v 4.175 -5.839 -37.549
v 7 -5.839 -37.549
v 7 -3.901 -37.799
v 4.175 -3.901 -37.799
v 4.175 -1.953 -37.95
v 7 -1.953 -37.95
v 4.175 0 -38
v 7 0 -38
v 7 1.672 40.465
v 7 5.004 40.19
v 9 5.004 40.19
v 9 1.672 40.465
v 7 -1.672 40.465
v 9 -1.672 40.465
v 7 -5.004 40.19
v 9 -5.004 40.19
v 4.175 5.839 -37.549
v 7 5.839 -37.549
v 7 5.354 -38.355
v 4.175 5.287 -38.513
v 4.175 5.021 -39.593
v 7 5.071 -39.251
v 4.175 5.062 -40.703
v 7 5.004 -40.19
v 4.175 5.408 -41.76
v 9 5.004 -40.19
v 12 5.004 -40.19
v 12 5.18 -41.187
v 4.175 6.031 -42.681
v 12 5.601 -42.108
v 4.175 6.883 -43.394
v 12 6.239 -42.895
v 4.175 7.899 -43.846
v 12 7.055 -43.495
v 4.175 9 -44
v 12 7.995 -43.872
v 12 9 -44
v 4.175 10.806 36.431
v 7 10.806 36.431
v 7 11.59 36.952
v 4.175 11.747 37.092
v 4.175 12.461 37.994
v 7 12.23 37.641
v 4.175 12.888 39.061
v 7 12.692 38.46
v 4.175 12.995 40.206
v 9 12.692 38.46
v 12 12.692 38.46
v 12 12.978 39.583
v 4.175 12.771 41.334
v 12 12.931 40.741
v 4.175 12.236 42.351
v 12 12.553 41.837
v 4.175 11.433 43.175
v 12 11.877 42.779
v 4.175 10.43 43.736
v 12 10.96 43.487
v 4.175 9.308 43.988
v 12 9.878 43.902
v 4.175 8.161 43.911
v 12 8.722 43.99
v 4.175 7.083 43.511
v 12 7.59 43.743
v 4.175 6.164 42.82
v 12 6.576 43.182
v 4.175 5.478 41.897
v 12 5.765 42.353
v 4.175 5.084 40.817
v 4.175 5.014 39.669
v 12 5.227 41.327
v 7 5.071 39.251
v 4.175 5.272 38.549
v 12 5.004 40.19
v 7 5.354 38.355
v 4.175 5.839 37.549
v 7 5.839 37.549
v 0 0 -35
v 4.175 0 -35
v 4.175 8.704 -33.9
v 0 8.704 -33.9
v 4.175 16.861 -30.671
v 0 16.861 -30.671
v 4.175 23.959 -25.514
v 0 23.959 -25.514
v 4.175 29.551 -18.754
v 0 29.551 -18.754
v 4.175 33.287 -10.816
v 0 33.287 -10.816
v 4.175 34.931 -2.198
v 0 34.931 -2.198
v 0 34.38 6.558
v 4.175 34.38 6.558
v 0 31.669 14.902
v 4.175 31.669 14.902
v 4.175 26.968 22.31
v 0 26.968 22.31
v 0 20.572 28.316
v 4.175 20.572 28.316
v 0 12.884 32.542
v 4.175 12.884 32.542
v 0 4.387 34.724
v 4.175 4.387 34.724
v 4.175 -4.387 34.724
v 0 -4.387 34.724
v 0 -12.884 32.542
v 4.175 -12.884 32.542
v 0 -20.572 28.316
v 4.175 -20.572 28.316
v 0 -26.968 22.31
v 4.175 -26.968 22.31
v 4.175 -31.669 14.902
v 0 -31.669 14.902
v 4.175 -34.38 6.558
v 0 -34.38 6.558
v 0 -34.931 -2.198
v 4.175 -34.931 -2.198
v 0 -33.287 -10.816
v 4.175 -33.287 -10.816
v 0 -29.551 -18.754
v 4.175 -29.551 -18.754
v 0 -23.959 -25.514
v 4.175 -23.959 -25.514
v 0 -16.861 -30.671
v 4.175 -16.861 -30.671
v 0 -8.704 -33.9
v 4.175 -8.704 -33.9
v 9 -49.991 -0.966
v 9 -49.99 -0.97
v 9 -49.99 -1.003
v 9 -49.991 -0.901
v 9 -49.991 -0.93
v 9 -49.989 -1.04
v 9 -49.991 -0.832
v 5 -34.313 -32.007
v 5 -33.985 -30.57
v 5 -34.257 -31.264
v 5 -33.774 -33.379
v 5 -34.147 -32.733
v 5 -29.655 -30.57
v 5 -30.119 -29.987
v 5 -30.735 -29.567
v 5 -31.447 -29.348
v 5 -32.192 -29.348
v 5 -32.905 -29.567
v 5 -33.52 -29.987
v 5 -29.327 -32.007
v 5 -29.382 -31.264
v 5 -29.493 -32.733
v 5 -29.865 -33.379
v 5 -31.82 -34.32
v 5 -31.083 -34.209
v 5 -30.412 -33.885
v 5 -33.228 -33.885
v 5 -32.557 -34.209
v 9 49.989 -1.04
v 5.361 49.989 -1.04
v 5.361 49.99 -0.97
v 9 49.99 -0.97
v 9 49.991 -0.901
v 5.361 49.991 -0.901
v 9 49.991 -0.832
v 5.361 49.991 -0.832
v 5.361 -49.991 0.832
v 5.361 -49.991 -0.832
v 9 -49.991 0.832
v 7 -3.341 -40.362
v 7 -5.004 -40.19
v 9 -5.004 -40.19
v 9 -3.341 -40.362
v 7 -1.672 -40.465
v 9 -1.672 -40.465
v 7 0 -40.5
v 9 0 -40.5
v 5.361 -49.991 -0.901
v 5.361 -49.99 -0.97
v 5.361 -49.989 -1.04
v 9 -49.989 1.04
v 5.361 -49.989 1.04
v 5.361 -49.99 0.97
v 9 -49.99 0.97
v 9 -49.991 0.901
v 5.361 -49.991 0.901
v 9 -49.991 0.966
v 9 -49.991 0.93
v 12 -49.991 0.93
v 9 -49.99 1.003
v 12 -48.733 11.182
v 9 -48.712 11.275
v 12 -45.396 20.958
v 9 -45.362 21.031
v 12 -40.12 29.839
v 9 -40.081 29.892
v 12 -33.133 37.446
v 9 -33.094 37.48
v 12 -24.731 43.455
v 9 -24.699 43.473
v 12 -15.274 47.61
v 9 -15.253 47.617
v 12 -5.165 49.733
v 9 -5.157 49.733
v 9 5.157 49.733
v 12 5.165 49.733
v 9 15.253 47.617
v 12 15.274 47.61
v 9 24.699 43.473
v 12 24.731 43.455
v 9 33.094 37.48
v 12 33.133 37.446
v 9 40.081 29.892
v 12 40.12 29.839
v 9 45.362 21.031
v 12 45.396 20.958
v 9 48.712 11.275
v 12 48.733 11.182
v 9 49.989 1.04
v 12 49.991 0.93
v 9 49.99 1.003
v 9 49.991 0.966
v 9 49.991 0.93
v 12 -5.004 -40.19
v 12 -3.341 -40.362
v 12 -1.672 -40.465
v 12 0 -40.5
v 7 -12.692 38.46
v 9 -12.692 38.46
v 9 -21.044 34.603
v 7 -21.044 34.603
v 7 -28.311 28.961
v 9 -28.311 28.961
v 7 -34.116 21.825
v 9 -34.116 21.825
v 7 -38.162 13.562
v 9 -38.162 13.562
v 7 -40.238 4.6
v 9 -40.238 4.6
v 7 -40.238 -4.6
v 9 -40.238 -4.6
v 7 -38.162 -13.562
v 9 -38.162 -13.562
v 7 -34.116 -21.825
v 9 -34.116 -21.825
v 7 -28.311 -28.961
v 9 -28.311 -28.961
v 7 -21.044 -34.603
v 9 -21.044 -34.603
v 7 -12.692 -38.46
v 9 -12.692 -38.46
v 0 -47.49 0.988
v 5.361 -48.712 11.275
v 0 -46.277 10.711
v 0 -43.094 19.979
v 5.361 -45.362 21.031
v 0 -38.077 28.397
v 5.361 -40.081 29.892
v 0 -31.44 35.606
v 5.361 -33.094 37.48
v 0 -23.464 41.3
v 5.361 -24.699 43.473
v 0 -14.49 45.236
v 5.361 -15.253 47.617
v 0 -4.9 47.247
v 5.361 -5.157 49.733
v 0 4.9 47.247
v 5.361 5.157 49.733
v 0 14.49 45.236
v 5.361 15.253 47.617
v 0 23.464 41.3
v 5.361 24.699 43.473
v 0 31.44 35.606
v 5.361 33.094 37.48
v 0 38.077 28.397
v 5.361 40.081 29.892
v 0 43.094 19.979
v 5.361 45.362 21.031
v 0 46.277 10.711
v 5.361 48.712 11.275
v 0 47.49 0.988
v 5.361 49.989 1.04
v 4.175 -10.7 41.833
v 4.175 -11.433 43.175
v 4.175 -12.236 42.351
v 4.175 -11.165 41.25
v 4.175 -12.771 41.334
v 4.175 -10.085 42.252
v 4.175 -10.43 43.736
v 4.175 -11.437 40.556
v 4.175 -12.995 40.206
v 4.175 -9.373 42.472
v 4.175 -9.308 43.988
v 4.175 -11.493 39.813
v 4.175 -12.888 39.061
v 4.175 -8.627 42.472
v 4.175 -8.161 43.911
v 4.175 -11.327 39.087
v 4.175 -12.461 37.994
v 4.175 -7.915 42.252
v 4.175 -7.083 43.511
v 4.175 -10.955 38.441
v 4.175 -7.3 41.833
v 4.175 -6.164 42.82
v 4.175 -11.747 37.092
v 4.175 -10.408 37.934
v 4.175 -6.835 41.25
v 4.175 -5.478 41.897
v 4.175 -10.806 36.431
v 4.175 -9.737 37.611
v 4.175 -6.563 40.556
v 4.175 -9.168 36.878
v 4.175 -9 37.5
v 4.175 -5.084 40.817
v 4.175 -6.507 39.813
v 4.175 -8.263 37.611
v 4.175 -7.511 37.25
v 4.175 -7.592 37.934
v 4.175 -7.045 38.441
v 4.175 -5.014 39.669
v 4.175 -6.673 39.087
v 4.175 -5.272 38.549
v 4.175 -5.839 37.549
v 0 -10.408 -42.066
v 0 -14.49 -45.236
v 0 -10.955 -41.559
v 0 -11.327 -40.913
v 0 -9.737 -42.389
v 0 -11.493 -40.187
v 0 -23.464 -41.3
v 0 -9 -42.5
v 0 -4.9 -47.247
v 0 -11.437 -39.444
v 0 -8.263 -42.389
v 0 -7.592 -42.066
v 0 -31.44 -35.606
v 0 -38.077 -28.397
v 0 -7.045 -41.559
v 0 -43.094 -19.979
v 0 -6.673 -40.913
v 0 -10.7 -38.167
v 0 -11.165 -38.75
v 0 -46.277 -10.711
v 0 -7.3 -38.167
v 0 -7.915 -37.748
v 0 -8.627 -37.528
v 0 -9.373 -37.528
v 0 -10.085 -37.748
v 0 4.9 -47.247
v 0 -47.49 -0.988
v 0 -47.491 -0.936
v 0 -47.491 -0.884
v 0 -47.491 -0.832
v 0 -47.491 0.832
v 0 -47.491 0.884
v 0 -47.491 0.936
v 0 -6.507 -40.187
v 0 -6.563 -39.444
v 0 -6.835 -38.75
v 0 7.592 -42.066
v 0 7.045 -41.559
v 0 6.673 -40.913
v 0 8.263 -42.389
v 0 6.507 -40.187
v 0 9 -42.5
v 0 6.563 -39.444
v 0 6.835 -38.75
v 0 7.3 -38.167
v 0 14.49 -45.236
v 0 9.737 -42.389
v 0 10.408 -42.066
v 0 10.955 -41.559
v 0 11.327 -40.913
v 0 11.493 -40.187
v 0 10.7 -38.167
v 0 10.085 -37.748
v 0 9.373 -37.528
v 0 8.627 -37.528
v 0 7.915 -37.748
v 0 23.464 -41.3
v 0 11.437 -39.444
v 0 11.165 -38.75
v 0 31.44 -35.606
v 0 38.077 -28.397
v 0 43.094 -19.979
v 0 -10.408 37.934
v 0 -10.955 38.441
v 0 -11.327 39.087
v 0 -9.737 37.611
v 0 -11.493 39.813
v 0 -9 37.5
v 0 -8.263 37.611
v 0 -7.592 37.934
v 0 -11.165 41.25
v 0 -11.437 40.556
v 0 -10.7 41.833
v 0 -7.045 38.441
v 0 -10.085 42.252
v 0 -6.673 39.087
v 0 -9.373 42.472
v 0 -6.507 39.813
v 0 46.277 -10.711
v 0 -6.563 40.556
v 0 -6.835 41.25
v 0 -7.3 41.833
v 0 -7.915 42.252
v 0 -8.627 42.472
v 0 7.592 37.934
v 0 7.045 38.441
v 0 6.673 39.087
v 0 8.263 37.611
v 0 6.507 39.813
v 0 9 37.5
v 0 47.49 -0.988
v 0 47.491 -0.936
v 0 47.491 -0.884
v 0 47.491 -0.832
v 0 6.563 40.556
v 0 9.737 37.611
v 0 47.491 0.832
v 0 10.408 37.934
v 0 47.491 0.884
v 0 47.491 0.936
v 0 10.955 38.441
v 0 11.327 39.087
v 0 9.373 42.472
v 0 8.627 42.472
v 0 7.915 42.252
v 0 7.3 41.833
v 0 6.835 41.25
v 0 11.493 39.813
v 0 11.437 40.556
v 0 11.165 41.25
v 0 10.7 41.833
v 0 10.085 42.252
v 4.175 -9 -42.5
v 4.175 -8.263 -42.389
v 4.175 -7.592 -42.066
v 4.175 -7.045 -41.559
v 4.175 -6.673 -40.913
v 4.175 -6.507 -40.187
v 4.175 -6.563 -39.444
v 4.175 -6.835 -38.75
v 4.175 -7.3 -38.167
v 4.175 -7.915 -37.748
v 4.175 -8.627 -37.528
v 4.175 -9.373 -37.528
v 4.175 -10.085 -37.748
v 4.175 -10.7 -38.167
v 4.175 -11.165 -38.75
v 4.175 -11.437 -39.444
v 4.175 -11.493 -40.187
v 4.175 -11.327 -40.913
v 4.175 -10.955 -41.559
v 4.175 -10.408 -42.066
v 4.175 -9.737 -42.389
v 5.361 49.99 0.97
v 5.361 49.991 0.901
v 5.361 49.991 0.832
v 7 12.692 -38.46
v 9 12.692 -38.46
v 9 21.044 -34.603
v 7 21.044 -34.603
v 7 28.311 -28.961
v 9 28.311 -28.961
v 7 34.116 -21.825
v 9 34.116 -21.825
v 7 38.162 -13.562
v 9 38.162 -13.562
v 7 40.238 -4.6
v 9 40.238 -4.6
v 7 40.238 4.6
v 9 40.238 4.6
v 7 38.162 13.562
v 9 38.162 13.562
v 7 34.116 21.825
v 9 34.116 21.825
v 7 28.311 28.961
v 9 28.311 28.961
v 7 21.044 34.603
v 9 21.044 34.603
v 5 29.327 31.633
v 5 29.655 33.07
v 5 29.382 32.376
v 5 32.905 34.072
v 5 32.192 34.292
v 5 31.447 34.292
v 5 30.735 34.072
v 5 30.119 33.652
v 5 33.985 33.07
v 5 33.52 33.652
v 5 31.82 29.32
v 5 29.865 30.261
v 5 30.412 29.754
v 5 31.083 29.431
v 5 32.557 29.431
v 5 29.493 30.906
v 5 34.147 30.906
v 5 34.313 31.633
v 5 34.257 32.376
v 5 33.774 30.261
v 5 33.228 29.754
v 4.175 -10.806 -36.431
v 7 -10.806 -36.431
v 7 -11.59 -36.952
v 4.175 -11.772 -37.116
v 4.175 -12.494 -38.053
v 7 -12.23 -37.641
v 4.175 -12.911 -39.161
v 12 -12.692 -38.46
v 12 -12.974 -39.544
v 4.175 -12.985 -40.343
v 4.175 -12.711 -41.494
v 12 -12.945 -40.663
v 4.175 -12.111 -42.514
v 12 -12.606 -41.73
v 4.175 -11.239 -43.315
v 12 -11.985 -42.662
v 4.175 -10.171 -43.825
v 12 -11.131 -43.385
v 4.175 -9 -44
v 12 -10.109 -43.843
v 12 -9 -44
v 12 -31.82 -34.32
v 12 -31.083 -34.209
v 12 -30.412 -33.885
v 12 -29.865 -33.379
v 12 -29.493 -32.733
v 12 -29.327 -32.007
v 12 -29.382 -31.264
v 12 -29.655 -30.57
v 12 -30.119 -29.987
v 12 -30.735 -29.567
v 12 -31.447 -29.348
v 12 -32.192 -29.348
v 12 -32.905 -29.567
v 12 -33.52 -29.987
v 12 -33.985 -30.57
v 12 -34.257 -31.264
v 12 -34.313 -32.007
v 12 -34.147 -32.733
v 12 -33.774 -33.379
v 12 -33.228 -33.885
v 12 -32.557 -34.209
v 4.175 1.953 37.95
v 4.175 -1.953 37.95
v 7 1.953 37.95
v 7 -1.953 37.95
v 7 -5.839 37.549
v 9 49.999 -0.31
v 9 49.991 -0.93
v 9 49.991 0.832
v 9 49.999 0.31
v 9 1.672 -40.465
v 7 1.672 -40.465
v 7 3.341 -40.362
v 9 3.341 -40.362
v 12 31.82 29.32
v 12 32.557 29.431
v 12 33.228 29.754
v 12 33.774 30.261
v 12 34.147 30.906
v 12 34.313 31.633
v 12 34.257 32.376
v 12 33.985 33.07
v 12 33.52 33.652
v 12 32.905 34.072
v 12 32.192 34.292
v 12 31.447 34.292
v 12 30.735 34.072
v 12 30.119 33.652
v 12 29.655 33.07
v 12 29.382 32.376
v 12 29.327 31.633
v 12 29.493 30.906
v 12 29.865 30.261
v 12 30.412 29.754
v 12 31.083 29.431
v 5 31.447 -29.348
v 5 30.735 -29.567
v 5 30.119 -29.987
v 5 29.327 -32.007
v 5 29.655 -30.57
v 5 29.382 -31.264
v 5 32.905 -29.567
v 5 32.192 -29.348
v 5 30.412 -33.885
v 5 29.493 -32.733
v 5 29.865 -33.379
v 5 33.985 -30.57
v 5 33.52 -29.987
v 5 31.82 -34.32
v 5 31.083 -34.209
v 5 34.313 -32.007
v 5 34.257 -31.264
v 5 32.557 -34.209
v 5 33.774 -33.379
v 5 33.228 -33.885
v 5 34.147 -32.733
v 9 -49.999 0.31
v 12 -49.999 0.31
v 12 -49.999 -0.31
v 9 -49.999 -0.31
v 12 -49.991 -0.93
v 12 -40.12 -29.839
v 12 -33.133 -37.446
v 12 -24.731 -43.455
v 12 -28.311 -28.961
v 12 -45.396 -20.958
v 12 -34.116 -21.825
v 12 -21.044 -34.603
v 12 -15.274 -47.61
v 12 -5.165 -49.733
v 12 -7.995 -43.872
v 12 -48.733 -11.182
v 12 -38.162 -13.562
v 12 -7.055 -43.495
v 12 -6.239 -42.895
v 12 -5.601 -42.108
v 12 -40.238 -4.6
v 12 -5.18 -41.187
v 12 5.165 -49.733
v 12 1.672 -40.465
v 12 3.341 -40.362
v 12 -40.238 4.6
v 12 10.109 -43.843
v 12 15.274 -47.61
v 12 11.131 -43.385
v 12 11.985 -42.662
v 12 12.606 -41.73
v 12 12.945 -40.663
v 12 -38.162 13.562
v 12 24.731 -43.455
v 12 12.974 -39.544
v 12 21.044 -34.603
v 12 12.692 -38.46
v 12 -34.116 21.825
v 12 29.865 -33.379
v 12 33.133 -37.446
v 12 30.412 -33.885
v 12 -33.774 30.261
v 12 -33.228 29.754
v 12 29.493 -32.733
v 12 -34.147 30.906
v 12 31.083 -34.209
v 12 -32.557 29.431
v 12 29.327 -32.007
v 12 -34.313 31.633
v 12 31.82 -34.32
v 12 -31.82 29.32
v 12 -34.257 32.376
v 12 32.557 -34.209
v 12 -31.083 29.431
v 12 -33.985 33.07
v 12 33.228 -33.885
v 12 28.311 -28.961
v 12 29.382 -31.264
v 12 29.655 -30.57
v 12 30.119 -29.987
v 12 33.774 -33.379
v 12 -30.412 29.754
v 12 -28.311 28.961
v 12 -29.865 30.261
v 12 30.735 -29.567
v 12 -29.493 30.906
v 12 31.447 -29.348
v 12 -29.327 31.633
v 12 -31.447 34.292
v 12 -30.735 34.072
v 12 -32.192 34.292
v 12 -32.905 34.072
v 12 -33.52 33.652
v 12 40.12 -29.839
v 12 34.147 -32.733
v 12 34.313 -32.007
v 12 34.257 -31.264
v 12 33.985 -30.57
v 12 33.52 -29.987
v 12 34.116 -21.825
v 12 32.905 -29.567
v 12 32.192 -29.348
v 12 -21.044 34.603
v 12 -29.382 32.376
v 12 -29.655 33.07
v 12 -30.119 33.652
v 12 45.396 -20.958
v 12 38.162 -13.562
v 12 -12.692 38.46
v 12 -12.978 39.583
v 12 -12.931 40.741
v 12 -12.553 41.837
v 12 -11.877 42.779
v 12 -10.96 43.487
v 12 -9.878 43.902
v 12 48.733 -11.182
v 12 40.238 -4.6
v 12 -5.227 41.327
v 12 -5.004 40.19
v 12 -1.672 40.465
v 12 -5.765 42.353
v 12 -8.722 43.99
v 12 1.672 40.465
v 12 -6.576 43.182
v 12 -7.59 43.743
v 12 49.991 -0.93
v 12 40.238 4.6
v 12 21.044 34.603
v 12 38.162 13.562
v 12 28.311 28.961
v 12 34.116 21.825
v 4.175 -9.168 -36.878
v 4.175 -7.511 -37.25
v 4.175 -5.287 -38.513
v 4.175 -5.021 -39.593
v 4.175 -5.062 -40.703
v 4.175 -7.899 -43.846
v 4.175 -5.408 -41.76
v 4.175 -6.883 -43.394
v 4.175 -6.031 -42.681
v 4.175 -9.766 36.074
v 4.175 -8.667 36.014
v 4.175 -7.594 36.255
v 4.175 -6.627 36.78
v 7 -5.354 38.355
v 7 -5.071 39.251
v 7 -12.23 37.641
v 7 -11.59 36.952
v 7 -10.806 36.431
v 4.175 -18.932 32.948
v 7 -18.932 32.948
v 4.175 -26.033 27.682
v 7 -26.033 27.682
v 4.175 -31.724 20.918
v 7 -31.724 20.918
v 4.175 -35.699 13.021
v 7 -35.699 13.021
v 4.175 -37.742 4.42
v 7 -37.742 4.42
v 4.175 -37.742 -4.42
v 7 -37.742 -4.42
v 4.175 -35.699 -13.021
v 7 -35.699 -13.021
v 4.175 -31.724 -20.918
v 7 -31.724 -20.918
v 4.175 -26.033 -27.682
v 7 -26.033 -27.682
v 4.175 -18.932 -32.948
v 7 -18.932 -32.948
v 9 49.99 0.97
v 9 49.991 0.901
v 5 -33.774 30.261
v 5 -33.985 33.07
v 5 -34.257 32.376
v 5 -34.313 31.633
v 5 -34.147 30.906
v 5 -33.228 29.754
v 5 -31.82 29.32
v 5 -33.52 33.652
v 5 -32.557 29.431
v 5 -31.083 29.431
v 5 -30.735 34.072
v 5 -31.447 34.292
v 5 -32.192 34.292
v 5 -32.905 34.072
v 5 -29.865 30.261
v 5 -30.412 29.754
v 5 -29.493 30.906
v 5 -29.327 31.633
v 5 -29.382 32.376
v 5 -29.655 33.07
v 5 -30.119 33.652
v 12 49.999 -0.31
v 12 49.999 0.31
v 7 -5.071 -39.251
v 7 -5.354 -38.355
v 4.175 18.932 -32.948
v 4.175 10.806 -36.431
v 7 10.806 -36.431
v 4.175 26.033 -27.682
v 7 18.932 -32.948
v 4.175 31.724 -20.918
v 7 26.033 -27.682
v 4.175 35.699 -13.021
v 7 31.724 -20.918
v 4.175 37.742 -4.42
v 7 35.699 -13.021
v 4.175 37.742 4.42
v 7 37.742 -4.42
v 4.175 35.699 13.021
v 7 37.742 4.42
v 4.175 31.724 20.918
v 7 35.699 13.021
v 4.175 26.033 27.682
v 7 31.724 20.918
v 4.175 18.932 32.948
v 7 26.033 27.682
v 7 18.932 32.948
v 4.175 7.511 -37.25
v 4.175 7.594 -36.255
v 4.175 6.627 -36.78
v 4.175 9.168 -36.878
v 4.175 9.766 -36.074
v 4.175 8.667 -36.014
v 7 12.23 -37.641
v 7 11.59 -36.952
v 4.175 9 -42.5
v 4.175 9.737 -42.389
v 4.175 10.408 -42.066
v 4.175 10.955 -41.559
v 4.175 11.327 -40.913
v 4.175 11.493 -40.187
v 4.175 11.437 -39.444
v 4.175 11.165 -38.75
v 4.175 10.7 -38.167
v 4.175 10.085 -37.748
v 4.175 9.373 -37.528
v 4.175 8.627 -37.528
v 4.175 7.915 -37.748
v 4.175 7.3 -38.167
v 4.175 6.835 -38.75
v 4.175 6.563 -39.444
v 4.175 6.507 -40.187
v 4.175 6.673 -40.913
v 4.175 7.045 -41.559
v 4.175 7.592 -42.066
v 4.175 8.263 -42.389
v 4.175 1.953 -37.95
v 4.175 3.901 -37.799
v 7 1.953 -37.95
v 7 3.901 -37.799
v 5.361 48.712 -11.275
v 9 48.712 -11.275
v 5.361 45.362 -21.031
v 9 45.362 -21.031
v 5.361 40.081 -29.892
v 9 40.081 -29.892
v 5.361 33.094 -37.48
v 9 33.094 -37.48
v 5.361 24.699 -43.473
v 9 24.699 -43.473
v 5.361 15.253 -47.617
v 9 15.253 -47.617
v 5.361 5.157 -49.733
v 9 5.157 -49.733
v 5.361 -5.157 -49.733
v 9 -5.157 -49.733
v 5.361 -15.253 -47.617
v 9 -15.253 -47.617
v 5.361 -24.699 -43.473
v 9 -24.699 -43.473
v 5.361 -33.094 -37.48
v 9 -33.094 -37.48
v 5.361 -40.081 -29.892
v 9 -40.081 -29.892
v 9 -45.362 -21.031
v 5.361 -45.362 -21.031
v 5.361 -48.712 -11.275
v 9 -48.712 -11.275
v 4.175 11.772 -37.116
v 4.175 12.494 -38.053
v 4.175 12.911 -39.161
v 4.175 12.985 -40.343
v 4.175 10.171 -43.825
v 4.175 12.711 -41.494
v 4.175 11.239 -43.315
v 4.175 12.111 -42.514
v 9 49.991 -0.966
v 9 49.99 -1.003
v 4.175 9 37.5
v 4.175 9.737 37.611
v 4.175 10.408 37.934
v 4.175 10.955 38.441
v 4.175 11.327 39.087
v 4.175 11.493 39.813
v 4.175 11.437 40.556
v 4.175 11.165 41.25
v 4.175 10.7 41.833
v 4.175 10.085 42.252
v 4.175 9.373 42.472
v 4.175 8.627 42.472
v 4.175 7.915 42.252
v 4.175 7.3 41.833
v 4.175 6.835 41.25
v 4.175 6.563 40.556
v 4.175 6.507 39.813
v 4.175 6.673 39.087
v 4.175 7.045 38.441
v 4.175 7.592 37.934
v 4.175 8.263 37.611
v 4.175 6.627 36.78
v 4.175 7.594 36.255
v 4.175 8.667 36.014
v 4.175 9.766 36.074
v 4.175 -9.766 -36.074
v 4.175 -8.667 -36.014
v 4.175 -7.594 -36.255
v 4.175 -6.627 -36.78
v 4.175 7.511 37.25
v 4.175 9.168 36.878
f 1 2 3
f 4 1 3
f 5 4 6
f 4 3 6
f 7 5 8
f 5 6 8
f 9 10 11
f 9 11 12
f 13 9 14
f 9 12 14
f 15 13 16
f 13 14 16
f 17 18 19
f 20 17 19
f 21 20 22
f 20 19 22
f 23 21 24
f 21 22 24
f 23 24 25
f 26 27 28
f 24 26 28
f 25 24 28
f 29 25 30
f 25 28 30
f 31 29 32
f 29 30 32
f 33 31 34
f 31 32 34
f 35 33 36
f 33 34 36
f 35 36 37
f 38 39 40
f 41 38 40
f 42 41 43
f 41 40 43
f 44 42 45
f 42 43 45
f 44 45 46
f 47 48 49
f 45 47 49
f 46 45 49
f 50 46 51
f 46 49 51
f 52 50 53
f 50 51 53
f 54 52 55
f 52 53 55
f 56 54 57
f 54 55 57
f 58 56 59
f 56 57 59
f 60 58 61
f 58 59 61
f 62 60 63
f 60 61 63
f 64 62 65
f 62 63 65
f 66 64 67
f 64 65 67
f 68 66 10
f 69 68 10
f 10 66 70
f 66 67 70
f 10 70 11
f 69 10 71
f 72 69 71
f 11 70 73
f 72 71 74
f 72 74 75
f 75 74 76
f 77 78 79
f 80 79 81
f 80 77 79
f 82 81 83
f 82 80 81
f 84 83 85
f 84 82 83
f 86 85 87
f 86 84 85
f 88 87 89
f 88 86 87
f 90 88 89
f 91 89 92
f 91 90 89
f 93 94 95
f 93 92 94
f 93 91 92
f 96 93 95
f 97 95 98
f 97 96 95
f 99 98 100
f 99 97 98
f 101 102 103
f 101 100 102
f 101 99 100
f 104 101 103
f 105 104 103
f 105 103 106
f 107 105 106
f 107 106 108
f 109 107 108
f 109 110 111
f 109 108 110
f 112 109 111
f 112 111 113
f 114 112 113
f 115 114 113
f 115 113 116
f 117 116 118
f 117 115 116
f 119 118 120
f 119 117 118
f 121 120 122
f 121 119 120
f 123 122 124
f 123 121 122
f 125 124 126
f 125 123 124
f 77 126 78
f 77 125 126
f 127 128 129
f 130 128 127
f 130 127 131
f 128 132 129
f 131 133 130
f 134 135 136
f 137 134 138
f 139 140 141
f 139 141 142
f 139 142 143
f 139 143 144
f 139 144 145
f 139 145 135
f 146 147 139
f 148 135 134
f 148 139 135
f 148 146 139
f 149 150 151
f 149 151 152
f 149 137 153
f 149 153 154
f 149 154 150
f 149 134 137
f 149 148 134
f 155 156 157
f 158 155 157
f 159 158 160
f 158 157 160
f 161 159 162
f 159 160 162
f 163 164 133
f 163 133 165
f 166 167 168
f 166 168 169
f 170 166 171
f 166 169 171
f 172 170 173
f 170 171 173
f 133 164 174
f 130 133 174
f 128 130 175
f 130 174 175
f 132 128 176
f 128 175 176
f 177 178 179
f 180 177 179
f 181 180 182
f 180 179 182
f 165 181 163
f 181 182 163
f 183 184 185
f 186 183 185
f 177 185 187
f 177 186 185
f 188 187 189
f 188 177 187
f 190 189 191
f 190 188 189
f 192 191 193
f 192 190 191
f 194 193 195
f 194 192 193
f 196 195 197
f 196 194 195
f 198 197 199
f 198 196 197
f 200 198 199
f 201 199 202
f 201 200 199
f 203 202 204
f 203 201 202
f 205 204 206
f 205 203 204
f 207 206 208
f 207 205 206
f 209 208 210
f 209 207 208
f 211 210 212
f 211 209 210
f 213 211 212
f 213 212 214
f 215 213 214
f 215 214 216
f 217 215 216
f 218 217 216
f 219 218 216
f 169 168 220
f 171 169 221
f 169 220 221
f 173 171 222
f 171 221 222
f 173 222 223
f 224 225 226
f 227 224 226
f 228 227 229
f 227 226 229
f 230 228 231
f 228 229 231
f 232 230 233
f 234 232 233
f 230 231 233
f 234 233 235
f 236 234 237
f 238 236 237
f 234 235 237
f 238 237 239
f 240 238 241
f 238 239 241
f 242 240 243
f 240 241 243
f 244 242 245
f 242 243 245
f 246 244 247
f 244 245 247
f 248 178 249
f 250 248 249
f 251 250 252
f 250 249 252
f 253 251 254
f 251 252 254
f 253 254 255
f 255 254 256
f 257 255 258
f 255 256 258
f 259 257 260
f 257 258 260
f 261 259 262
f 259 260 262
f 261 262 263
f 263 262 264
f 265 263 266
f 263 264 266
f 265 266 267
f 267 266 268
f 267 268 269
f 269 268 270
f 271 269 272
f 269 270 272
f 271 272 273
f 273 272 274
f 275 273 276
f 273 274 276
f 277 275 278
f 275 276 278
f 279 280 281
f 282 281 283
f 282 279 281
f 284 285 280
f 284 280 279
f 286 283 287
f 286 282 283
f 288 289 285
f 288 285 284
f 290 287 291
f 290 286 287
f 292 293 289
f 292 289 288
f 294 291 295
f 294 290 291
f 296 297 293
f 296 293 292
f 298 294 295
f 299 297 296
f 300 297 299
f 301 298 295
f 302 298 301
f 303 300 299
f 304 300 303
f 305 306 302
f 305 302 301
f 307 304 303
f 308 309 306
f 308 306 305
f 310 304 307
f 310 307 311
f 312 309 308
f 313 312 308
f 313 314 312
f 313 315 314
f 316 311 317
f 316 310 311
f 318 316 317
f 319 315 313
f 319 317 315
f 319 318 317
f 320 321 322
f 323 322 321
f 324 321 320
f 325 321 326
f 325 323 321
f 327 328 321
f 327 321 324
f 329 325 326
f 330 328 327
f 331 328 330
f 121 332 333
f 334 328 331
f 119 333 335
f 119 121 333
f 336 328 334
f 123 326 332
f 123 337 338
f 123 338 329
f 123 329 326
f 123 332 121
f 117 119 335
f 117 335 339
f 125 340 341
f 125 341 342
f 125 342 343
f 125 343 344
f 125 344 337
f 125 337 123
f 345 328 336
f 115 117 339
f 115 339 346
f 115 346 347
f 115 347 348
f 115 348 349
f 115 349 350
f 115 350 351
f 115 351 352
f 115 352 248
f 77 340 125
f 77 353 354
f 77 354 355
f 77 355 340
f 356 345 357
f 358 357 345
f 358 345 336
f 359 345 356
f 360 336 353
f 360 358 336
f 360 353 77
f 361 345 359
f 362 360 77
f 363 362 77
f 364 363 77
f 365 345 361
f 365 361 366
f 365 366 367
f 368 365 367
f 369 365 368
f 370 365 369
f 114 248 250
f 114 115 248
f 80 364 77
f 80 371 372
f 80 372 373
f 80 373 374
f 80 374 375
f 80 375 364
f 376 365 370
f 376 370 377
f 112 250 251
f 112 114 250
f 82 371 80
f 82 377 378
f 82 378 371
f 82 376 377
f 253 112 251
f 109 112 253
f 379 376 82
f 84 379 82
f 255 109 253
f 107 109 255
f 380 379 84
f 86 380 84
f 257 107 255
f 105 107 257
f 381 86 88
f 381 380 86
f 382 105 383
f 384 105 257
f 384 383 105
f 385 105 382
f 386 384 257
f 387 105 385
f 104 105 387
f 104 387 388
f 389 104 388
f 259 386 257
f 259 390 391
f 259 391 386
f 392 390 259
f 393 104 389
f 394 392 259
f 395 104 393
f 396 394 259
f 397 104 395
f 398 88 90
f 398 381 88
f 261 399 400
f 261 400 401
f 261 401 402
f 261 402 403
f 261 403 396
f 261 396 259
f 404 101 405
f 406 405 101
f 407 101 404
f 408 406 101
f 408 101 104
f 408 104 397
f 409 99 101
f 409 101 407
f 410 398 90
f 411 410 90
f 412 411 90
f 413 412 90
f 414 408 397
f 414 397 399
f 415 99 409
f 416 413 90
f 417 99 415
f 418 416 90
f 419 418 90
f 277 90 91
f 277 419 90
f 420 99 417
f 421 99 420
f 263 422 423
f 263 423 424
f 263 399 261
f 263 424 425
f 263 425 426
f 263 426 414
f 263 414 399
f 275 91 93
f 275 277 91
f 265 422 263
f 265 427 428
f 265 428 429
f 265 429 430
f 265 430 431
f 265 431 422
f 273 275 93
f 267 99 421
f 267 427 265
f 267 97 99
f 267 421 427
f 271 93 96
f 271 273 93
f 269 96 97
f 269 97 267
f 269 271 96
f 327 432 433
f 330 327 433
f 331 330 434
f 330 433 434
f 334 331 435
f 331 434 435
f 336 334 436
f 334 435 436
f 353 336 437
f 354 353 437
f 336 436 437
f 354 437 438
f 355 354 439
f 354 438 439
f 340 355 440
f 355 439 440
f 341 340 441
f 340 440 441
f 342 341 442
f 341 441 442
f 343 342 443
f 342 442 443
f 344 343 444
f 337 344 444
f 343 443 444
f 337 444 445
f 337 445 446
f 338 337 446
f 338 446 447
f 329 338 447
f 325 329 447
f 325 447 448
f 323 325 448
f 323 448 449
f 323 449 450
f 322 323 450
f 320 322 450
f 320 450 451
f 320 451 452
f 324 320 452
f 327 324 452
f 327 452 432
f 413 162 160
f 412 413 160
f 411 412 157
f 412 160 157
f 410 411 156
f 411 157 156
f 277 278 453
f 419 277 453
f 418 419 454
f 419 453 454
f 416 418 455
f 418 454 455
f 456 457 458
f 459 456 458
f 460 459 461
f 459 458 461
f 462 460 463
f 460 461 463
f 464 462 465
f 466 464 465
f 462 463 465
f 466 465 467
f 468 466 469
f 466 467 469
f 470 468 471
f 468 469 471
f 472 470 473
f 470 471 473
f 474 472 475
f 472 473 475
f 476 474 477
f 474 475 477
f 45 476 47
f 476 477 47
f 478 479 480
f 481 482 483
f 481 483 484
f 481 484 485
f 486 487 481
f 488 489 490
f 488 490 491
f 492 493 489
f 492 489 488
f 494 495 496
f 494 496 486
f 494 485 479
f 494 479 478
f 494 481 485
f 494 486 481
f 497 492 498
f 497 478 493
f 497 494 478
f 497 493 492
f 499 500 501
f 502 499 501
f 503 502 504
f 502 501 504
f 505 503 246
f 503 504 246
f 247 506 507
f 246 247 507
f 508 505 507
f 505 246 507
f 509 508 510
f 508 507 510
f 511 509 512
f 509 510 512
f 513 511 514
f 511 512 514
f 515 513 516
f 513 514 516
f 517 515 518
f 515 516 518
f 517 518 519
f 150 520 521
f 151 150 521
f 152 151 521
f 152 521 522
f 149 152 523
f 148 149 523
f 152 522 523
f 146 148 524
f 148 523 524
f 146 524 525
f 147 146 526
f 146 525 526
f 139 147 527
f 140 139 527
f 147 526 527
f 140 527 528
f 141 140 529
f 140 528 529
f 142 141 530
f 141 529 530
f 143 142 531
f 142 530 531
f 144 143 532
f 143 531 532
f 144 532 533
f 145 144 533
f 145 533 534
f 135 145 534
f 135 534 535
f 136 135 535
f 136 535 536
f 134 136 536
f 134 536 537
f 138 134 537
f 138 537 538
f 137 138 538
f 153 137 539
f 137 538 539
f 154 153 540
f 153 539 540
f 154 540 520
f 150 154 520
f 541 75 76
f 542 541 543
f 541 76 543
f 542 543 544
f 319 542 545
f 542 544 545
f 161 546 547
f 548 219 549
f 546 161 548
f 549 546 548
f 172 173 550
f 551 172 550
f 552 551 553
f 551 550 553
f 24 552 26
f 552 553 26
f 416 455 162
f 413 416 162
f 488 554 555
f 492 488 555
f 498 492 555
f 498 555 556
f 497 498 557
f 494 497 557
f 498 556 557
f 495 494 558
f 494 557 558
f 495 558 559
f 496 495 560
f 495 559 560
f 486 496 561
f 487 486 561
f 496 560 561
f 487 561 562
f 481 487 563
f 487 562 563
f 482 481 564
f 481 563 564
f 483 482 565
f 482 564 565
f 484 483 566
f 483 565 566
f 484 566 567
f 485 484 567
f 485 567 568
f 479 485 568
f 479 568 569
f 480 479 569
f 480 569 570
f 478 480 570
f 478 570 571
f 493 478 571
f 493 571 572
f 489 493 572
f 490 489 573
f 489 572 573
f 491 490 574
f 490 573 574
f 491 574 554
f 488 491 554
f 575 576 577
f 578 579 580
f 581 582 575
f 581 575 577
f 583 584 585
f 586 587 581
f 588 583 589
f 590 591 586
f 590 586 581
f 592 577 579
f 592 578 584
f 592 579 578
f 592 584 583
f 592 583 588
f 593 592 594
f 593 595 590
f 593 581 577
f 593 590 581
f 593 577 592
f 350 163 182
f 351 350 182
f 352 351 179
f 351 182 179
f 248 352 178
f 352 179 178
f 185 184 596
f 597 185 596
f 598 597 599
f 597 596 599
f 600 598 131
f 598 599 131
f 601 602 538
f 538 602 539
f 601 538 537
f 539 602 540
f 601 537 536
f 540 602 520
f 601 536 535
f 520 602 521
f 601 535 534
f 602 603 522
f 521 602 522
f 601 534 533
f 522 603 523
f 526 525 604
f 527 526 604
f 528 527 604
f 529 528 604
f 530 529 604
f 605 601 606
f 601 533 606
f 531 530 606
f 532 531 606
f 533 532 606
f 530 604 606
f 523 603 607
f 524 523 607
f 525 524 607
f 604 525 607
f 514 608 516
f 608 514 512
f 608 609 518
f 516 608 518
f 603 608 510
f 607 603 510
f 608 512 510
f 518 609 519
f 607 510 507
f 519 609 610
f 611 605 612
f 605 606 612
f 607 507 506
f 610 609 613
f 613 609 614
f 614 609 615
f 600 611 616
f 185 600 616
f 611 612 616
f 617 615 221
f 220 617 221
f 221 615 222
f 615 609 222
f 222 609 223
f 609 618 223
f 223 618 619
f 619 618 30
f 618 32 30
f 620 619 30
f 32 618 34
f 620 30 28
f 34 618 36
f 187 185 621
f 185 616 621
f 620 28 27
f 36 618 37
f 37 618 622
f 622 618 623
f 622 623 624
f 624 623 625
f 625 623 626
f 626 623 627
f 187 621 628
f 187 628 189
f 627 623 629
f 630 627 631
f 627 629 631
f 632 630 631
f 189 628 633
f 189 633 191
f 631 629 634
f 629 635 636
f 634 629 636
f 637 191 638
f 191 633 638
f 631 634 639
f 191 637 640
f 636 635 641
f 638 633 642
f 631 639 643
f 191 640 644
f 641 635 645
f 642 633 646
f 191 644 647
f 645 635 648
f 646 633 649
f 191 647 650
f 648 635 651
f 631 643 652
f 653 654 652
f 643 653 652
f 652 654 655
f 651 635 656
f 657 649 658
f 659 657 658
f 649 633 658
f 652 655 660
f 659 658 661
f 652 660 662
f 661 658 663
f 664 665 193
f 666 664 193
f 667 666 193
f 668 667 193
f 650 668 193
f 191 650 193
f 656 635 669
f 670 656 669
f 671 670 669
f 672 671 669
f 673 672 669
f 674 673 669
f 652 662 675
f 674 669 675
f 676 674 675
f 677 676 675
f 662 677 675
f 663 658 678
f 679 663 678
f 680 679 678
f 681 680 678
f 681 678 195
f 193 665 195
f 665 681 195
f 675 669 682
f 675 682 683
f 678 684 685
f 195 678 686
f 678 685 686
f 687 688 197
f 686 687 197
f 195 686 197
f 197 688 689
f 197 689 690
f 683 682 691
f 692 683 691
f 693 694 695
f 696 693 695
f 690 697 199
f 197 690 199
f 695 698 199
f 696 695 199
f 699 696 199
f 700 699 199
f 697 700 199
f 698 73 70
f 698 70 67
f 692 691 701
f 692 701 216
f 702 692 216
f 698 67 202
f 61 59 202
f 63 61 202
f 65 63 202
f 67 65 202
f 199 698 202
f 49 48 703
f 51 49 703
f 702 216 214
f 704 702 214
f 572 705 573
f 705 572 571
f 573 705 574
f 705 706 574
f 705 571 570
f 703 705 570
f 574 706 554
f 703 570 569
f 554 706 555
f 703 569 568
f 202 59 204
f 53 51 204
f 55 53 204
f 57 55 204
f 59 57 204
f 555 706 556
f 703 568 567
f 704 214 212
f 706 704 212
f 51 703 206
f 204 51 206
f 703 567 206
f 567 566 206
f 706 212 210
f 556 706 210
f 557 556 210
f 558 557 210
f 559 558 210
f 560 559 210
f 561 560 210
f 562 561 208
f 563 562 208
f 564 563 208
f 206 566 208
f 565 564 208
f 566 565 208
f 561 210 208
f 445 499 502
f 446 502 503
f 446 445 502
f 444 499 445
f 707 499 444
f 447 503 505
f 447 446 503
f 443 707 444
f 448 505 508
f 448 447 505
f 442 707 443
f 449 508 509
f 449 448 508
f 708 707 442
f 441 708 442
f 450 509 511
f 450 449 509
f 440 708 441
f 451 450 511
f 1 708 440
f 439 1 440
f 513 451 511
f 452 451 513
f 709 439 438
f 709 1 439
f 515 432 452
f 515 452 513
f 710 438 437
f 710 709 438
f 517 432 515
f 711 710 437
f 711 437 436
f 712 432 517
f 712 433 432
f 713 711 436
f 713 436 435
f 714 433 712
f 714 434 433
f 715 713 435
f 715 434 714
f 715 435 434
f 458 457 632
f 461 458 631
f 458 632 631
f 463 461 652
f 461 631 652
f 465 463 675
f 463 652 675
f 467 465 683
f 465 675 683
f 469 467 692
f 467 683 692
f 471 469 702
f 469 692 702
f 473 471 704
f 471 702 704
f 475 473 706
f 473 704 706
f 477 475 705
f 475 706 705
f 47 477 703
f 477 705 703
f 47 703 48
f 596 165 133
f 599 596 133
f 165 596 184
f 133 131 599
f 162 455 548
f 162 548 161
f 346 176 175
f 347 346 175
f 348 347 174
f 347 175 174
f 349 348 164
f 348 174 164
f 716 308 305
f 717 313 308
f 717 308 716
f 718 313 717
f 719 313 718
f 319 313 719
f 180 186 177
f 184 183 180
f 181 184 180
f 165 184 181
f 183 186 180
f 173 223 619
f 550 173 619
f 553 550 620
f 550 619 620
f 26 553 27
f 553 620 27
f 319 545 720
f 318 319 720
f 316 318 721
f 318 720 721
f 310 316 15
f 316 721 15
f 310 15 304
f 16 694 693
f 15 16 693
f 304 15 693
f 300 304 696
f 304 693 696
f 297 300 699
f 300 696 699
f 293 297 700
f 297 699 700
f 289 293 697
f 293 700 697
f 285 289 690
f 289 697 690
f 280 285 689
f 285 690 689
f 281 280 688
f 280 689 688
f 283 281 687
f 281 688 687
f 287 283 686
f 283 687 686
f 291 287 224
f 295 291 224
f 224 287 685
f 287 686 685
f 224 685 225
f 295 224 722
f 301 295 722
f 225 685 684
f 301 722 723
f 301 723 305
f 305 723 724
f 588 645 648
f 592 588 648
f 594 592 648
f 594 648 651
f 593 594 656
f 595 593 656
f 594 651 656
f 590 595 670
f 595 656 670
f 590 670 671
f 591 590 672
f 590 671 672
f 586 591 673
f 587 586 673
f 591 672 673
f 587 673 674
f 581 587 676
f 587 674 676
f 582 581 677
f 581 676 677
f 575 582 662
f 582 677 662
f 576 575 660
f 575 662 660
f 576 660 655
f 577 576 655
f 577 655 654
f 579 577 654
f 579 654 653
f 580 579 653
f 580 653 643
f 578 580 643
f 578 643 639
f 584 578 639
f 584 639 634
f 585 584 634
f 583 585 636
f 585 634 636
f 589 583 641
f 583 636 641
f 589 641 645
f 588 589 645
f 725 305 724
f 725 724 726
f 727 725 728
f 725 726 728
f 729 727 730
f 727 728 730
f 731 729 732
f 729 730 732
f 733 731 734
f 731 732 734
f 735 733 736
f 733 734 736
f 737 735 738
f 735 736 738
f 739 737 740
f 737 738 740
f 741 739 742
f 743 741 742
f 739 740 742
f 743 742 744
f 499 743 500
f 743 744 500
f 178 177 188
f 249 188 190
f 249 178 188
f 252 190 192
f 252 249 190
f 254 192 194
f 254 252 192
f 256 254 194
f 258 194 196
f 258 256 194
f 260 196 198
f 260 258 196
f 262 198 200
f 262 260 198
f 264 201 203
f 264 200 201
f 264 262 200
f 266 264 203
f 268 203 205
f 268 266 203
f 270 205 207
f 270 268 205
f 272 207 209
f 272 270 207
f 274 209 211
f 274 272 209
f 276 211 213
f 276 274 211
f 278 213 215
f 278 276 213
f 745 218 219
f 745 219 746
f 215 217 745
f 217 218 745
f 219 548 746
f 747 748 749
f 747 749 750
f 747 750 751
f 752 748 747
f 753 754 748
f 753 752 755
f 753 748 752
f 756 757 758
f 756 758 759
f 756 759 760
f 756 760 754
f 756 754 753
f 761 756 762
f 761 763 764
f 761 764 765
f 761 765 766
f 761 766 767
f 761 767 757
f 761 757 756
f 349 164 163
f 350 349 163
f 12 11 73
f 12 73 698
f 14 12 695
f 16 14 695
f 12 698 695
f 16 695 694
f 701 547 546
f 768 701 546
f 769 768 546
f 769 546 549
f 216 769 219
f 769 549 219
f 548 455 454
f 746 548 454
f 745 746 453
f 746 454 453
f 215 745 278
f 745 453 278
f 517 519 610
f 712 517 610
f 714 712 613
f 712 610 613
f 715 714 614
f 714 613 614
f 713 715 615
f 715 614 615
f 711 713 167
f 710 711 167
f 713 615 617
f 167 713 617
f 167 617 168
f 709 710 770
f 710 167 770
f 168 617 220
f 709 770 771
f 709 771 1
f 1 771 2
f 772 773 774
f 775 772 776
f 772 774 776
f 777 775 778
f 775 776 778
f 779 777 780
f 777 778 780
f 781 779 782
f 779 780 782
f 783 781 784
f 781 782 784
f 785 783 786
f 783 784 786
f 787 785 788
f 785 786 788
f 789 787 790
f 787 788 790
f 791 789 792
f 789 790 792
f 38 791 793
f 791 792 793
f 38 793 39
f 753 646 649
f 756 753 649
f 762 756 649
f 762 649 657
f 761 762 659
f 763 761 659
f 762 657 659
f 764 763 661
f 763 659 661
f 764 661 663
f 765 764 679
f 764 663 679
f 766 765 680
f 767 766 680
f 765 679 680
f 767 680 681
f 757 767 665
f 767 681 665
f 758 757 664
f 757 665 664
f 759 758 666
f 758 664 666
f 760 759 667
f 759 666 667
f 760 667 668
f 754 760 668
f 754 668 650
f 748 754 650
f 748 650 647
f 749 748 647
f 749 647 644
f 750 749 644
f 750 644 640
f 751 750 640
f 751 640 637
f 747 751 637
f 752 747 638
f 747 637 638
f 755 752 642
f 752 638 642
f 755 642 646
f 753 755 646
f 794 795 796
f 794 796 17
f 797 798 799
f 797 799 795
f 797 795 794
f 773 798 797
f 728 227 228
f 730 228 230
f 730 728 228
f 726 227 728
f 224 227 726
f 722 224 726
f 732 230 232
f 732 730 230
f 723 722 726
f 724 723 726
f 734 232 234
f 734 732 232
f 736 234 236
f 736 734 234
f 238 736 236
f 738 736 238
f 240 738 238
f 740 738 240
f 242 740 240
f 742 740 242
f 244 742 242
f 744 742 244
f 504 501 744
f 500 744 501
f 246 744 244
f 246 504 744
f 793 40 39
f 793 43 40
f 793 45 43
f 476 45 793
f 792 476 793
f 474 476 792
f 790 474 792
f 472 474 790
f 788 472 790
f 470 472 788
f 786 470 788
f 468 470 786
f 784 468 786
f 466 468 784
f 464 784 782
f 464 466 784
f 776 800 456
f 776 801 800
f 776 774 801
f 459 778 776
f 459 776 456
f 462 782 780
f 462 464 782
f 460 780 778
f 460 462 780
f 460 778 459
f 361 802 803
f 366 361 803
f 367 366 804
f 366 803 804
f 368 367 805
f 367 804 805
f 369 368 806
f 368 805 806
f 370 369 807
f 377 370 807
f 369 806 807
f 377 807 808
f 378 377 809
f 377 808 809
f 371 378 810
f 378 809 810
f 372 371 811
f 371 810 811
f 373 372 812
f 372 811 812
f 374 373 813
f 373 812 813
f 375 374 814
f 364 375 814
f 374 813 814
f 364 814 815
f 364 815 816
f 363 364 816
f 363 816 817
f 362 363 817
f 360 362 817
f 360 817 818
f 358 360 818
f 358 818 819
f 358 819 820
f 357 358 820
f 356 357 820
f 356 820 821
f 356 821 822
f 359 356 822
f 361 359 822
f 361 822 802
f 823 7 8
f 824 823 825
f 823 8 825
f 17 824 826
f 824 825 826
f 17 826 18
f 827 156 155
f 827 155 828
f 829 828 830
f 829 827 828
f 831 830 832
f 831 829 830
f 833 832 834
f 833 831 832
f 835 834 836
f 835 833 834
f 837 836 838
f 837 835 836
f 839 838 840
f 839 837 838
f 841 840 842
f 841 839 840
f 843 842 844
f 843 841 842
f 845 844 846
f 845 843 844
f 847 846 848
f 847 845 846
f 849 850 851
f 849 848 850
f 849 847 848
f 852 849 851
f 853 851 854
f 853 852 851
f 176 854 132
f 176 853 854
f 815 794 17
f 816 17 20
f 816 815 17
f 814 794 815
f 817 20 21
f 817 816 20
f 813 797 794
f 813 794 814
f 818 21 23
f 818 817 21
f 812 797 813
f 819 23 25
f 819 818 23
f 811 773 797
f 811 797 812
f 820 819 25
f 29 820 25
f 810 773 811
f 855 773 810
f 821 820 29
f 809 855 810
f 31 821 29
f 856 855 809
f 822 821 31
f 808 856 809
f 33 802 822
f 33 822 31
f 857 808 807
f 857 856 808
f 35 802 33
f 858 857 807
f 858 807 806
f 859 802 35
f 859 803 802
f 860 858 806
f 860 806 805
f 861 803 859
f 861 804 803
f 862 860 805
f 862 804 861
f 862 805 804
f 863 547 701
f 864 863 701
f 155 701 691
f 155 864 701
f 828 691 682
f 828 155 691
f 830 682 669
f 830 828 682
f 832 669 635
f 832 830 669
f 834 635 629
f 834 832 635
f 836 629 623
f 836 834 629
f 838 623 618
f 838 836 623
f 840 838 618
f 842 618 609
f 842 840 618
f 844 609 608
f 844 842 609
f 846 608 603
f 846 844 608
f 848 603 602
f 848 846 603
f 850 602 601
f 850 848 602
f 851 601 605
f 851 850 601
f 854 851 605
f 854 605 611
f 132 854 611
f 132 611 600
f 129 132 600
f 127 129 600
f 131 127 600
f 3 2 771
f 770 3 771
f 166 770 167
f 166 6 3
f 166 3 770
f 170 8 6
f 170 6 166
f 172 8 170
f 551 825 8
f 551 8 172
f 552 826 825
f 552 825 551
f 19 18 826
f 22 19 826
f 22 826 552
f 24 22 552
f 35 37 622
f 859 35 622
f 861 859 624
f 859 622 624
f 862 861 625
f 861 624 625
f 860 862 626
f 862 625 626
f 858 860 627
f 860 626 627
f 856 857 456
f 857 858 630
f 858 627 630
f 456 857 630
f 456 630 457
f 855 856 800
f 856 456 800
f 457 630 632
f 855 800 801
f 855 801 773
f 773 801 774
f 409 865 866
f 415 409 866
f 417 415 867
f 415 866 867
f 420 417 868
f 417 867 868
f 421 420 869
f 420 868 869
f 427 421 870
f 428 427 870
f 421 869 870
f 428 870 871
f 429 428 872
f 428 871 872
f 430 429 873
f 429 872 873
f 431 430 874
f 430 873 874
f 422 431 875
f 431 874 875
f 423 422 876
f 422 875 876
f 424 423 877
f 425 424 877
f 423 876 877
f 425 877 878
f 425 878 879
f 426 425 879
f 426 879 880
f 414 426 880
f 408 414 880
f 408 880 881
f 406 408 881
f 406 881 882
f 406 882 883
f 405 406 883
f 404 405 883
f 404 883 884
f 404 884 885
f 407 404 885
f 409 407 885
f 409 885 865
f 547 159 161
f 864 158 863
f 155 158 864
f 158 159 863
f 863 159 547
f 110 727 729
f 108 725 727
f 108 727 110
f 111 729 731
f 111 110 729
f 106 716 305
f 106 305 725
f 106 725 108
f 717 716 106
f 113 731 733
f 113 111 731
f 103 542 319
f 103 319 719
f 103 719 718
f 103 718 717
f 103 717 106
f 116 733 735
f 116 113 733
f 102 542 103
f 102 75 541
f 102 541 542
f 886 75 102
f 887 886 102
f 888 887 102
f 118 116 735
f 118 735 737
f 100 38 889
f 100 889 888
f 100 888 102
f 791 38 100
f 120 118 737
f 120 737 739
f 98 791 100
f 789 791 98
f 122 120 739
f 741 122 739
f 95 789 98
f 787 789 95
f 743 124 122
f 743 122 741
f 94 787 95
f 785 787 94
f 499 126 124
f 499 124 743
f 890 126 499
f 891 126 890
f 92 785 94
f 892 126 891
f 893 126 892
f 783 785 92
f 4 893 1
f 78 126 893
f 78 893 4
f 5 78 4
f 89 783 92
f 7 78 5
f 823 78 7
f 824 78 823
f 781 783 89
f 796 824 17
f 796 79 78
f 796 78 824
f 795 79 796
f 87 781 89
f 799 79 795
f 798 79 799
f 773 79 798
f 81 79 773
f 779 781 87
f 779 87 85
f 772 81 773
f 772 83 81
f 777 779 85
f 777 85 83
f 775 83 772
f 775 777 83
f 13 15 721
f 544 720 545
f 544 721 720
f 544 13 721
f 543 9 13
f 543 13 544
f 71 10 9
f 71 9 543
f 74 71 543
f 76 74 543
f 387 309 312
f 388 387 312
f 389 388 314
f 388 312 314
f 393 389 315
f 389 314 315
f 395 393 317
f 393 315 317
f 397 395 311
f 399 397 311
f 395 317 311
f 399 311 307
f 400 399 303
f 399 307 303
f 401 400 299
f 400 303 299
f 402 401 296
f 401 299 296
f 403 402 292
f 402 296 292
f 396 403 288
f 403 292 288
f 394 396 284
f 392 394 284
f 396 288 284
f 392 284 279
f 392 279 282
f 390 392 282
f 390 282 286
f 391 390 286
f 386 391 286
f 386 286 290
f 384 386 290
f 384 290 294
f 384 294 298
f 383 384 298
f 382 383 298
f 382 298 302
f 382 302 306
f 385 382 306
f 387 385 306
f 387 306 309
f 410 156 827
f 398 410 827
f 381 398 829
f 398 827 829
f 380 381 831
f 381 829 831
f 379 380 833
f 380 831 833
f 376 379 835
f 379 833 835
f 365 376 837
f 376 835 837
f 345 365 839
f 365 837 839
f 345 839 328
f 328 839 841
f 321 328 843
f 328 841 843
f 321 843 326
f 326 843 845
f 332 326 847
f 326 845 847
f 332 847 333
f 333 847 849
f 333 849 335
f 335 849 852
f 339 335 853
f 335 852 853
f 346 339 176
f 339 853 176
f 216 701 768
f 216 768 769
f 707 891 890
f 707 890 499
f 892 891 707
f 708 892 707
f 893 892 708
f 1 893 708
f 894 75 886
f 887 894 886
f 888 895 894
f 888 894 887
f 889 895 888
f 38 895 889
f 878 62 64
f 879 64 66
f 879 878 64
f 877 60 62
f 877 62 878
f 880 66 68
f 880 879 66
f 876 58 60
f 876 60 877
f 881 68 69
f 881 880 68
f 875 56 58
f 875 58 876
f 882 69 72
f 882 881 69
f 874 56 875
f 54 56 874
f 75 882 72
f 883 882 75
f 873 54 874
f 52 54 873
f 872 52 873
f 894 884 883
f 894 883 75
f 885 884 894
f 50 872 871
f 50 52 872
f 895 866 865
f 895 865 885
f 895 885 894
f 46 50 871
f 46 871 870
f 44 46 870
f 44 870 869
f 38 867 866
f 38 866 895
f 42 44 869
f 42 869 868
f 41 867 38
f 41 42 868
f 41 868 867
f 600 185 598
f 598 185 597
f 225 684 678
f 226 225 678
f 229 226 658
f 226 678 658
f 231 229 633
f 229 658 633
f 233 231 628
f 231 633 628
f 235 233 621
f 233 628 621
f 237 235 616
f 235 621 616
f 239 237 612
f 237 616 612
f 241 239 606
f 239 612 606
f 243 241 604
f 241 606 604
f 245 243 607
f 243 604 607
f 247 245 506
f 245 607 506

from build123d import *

# Parameters (mm, degrees)
SKETCH1_R           = 35.00000000000001
BOSS_EXTRUDE1_DEPTH = 12
SKETCH2_R           = 38
CUT_EXTRUDE1_DEPTH  = 7.825
SKETCH3_R           = 40.5
CUT_EXTRUDE2_DEPTH  = 5
BOSS_EXTRUDE3_START = -3
SKETCH4_R           = 50.000000000000014
SKETCH4_R_2         = 40.5
BOSS_EXTRUDE3_DEPTH = 3
FILLET1_R           = 10
SKETCH5_R           = 2.5000000000000018
CUT_EXTRUDE3_DEPTH  = 72.72168430816446
CUT_EXTRUDE4_REACH  = 73.722
SKETCH9_R           = 3.999999999999999
CHAMFER2_SIZE       = 2.5
CHAMFER2_SIZE2      = 5.361267301273932
SKETCH10_R          = 2.499999999999999
SKETCH10_R_2        = 2.5000000000000004
SKETCH10_R_3        = 2.5000000000000018
SKETCH10_R_4        = 2.499999999999998
CUT_EXTRUDE5_DEPTH  = 7


with BuildPart() as part:
    # Sketch1 → Boss-Extrude1 (new body)
    with BuildSketch(Plane(origin=(0, 0, 0), x_dir=(0, 0, -1), z_dir=(1, 0, 0))):
        with BuildLine():
            Line((-0.9297857327654514, 49.99135423741935), (0.9297857327657116, 49.99135423741935))
            ThreePointArc((0.9297857327657116, 49.99135423741935), (50, 4.17e-15), (0.9297857327657116, -49.99135423741935))
            Line((0.9297857327657116, -49.99135423741935), (-0.9297857327654514, -49.99135423741935))
            ThreePointArc((-0.9297857327654514, -49.99135423741935), (-50.00000000000001, 1.029e-14), (-0.9297857327654514, 49.99135423741935))
        make_face()
        Circle(SKETCH1_R, mode=Mode.SUBTRACT)
    extrude(amount=BOSS_EXTRUDE1_DEPTH)

    # Sketch2 → Cut-Extrude1 (cut)
    with BuildSketch(Plane(origin=(12, 0, 0), x_dir=(0, 0, -1), z_dir=(1, 0, 0))):
        Circle(SKETCH2_R)
    extrude(amount=-CUT_EXTRUDE1_DEPTH, mode=Mode.SUBTRACT)

    # Sketch3 → Cut-Extrude2 (cut)
    with BuildSketch(Plane(origin=(12, 0, 0), x_dir=(0, 0, -1), z_dir=(1, 0, 0))):
        Circle(SKETCH3_R)
    extrude(amount=-CUT_EXTRUDE2_DEPTH, mode=Mode.SUBTRACT)

    # Sketch4 → Boss-Extrude3 (add)
    with BuildSketch(Plane(origin=(12, 0, 0), x_dir=(0, 0, -1), z_dir=(1, 0, 0)).offset(BOSS_EXTRUDE3_START)):
        with Locations(Location((0, 0, 0), (0, 0, 91.065517382))):
            Circle(SKETCH4_R)
        Circle(SKETCH4_R_2, mode=Mode.SUBTRACT)
    extrude(amount=BOSS_EXTRUDE3_DEPTH)

    # Fillet1
    # the kernel refuses this fillet: 10 mm, written as the material it takes off along each edge
    with BuildSketch(Plane(origin=(-0.2743909200605188, 49.99135423741935, 0.9297857327658466), x_dir=(0, 0, -1), z_dir=(1, 0, 0))) as fillet1_piece_1:
        with BuildLine():
            CenterArc((0.09816907994918522, -10), FILLET1_R, 90, 1.1912889407278016)
            ThreePointArc((-0.10973508325497316, -0.00216144064516044), (-0.05486813470735008, -0.0010506100030554), (0, 0))
            Line((0, 0), (0.09816907994918522, 0))
        make_face()
    extrude(amount=9.27439092006841, mode=Mode.SUBTRACT)
    with BuildSketch(Plane(origin=(-0.27439092006290455, 49.99135423741935, -0.9297857327660938), x_dir=(0, 0, 1), z_dir=(1, 0, 0))) as fillet1_piece_2:
        with BuildLine():
            CenterArc((0.09816907994990931, 10), FILLET1_R, 268.80871105927287, 1.1912889407271336)
            ThreePointArc((-0.10973508325413761, 0.00216144064516044), (-0.05486813470693486, 0.0010506100030554), (0, 0))
            Line((0, 0), (0.09816907994990931, 0))
        make_face()
    extrude(amount=9.274390920070795, mode=Mode.SUBTRACT)
    with BuildSketch(Plane(origin=(-0.27439092006166854, -49.991354237419344, -0.9297857327653347), x_dir=(0, 0.019693077349376736, -0.9998060725483275), z_dir=(1, 0, 0))) as fillet1_piece_3:
        with BuildLine():
            CenterArc((0.09878073122404785, 9.999993976768026), FILLET1_R, 268.8715968385298, 1.19128894072702)
            Line((-0.09815004226971198, 0.00193325128475002), (0, 0))
            ThreePointArc((0, 0), (0.05487818401377818, -3.011615987851e-05), (0.10975636802755673, 0))
        make_face()
    extrude(amount=9.274390920069559, mode=Mode.SUBTRACT)
    with BuildSketch(Plane(origin=(-0.27439092005998433, -49.991354237419344, 0.9297857327658335), x_dir=(0, 0.019693077349452987, 0.999806072548326), z_dir=(1, 0, 0))) as fillet1_piece_4:
        with BuildLine():
            CenterArc((0.09878073122379578, -9.999993976768023), FILLET1_R, 89.93711422074833, 1.191288940726281)
            Line((-0.09815004227073397, -0.00193325128476343), (0, 0))
            ThreePointArc((0, 0), (0.05487818401320508, 3.011615987141e-05), (0.10975636802641013, 0))
        make_face()
    extrude(amount=9.274390920067875, mode=Mode.SUBTRACT)

    # Sketch5 → Cut-Extrude3 (cut, through all)
    with BuildSketch(Plane(origin=(12, 0, 0), x_dir=(0, 0, -1), z_dir=(1, 0, 0))):
        with Locations((39.999999999999986, 9.000000000000002)):
            Circle(SKETCH5_R)
        with Locations((39.999999999999986, -8.999999999999998)):
            Circle(SKETCH5_R)
        with Locations((-40.000000000000014, -8.999999999999998)):
            Circle(SKETCH5_R)
        with Locations((-40.000000000000014, 8.999999999999998)):
            Circle(SKETCH5_R)
    extrude(amount=-CUT_EXTRUDE3_DEPTH, mode=Mode.SUBTRACT)

    # Cut-Extrude4: up to this face of the body (flat: up to its plane)
    cut_extrude4_end = Plane(part.part.faces().sort_by_distance((4.175, 0, 36.925197693))[0])
    # Sketch9 → Cut-Extrude4 (cut, up to the picked face)
    with BuildSketch(Plane(origin=(12, 0, 0), x_dir=(0, 0, -1), z_dir=(1, 0, 0)), mode=Mode.PRIVATE) as cut_extrude4_sk1:
        with Locations((-40.000000000000014, 8.999999999999998)):
            Circle(SKETCH9_R)
    cut_extrude4_tool1 = split(extrude(cut_extrude4_sk1.sketch, amount=-CUT_EXTRUDE4_REACH, mode=Mode.PRIVATE), bisect_by=cut_extrude4_end, keep=Keep.BOTH, mode=Mode.PRIVATE)
    # Sketch9 → Cut-Extrude4 (cut, up to the picked face)
    with BuildSketch(Plane(origin=(12, 0, 0), x_dir=(0, 0, -1), z_dir=(1, 0, 0)), mode=Mode.PRIVATE) as cut_extrude4_sk2:
        with Locations((-40.000000000000014, -8.999999999999998)):
            Circle(SKETCH9_R)
    cut_extrude4_tool2 = split(extrude(cut_extrude4_sk2.sketch, amount=-CUT_EXTRUDE4_REACH, mode=Mode.PRIVATE), bisect_by=cut_extrude4_end, keep=Keep.BOTH, mode=Mode.PRIVATE)
    # Sketch9 → Cut-Extrude4 (cut, up to the picked face)
    with BuildSketch(Plane(origin=(12, 0, 0), x_dir=(0, 0, -1), z_dir=(1, 0, 0)), mode=Mode.PRIVATE) as cut_extrude4_sk3:
        with Locations((39.999999999999986, -8.999999999999998)):
            Circle(SKETCH9_R)
    cut_extrude4_tool3 = split(extrude(cut_extrude4_sk3.sketch, amount=-CUT_EXTRUDE4_REACH, mode=Mode.PRIVATE), bisect_by=cut_extrude4_end, keep=Keep.BOTH, mode=Mode.PRIVATE)
    # Sketch9 → Cut-Extrude4 (cut, up to the picked face)
    with BuildSketch(Plane(origin=(12, 0, 0), x_dir=(0, 0, -1), z_dir=(1, 0, 0)), mode=Mode.PRIVATE) as cut_extrude4_sk4:
        with Locations((39.999999999999986, 8.999999999999998)):
            Circle(SKETCH9_R)
    cut_extrude4_tool4 = split(extrude(cut_extrude4_sk4.sketch, amount=-CUT_EXTRUDE4_REACH, mode=Mode.PRIVATE), bisect_by=cut_extrude4_end, keep=Keep.BOTH, mode=Mode.PRIVATE)
    add(cut_extrude4_tool1.solids().sort_by(Axis((12, 9, 40), (-1, 0, 0)))[0], mode=Mode.SUBTRACT)
    add(cut_extrude4_tool2.solids().sort_by(Axis((12, -9, 40), (-1, 0, 0)))[0], mode=Mode.SUBTRACT)
    add(cut_extrude4_tool3.solids().sort_by(Axis((12, -9, -40), (-1, 0, 0)))[0], mode=Mode.SUBTRACT)
    add(cut_extrude4_tool4.solids().sort_by(Axis((12, 9, -40), (-1, 0, 0)))[0], mode=Mode.SUBTRACT)

    # Chamfer2
    chamfer2_edges = [part.edges().sort_by_distance(p)[0] for p in [
        (0, 4.163e-14, 50.000000000000014),
        (0, 8.2534e-13, -50),
        (0, 49.99135423741935, 4.9938e-13),
        (0, -49.99135423741935, 7.583e-14),
        (0, -49.99081386265752, 0.9355743520296814),
        (0, -49.990813862657504, -0.9355743520294721),
        (0, 49.99081386265747, -0.9355743520297026),
        (0, 49.99081386265747, 0.9355743520307873),
    ]]
    chamfer2_side = [part.faces().sort_by_distance(p)[0] for p in [
        (0, -48.576798978470165, -0.920873784247004),
    ]]
    chamfer(chamfer2_edges, length=CHAMFER2_SIZE, length2=CHAMFER2_SIZE2, reference=chamfer2_side[0])

    # Sketch10 → Cut-Extrude5 (cut)
    with BuildSketch(Plane(origin=(12, 0, 0), x_dir=(0, 0, -1), z_dir=(1, 0, 0))):
        with Locations((-31.819805153394583, 31.819805153394686)):
            Circle(SKETCH10_R)
        with Locations((31.819805153394796, 31.81980515339447)):
            Circle(SKETCH10_R_2)
        with Locations((31.81980515339436, -31.819805153394906)):
            Circle(SKETCH10_R_3)
        with Locations((-31.81980515339502, -31.81980515339425)):
            Circle(SKETCH10_R_4)
    extrude(amount=-CUT_EXTRUDE5_DEPTH, mode=Mode.SUBTRACT)


solid = part.part
